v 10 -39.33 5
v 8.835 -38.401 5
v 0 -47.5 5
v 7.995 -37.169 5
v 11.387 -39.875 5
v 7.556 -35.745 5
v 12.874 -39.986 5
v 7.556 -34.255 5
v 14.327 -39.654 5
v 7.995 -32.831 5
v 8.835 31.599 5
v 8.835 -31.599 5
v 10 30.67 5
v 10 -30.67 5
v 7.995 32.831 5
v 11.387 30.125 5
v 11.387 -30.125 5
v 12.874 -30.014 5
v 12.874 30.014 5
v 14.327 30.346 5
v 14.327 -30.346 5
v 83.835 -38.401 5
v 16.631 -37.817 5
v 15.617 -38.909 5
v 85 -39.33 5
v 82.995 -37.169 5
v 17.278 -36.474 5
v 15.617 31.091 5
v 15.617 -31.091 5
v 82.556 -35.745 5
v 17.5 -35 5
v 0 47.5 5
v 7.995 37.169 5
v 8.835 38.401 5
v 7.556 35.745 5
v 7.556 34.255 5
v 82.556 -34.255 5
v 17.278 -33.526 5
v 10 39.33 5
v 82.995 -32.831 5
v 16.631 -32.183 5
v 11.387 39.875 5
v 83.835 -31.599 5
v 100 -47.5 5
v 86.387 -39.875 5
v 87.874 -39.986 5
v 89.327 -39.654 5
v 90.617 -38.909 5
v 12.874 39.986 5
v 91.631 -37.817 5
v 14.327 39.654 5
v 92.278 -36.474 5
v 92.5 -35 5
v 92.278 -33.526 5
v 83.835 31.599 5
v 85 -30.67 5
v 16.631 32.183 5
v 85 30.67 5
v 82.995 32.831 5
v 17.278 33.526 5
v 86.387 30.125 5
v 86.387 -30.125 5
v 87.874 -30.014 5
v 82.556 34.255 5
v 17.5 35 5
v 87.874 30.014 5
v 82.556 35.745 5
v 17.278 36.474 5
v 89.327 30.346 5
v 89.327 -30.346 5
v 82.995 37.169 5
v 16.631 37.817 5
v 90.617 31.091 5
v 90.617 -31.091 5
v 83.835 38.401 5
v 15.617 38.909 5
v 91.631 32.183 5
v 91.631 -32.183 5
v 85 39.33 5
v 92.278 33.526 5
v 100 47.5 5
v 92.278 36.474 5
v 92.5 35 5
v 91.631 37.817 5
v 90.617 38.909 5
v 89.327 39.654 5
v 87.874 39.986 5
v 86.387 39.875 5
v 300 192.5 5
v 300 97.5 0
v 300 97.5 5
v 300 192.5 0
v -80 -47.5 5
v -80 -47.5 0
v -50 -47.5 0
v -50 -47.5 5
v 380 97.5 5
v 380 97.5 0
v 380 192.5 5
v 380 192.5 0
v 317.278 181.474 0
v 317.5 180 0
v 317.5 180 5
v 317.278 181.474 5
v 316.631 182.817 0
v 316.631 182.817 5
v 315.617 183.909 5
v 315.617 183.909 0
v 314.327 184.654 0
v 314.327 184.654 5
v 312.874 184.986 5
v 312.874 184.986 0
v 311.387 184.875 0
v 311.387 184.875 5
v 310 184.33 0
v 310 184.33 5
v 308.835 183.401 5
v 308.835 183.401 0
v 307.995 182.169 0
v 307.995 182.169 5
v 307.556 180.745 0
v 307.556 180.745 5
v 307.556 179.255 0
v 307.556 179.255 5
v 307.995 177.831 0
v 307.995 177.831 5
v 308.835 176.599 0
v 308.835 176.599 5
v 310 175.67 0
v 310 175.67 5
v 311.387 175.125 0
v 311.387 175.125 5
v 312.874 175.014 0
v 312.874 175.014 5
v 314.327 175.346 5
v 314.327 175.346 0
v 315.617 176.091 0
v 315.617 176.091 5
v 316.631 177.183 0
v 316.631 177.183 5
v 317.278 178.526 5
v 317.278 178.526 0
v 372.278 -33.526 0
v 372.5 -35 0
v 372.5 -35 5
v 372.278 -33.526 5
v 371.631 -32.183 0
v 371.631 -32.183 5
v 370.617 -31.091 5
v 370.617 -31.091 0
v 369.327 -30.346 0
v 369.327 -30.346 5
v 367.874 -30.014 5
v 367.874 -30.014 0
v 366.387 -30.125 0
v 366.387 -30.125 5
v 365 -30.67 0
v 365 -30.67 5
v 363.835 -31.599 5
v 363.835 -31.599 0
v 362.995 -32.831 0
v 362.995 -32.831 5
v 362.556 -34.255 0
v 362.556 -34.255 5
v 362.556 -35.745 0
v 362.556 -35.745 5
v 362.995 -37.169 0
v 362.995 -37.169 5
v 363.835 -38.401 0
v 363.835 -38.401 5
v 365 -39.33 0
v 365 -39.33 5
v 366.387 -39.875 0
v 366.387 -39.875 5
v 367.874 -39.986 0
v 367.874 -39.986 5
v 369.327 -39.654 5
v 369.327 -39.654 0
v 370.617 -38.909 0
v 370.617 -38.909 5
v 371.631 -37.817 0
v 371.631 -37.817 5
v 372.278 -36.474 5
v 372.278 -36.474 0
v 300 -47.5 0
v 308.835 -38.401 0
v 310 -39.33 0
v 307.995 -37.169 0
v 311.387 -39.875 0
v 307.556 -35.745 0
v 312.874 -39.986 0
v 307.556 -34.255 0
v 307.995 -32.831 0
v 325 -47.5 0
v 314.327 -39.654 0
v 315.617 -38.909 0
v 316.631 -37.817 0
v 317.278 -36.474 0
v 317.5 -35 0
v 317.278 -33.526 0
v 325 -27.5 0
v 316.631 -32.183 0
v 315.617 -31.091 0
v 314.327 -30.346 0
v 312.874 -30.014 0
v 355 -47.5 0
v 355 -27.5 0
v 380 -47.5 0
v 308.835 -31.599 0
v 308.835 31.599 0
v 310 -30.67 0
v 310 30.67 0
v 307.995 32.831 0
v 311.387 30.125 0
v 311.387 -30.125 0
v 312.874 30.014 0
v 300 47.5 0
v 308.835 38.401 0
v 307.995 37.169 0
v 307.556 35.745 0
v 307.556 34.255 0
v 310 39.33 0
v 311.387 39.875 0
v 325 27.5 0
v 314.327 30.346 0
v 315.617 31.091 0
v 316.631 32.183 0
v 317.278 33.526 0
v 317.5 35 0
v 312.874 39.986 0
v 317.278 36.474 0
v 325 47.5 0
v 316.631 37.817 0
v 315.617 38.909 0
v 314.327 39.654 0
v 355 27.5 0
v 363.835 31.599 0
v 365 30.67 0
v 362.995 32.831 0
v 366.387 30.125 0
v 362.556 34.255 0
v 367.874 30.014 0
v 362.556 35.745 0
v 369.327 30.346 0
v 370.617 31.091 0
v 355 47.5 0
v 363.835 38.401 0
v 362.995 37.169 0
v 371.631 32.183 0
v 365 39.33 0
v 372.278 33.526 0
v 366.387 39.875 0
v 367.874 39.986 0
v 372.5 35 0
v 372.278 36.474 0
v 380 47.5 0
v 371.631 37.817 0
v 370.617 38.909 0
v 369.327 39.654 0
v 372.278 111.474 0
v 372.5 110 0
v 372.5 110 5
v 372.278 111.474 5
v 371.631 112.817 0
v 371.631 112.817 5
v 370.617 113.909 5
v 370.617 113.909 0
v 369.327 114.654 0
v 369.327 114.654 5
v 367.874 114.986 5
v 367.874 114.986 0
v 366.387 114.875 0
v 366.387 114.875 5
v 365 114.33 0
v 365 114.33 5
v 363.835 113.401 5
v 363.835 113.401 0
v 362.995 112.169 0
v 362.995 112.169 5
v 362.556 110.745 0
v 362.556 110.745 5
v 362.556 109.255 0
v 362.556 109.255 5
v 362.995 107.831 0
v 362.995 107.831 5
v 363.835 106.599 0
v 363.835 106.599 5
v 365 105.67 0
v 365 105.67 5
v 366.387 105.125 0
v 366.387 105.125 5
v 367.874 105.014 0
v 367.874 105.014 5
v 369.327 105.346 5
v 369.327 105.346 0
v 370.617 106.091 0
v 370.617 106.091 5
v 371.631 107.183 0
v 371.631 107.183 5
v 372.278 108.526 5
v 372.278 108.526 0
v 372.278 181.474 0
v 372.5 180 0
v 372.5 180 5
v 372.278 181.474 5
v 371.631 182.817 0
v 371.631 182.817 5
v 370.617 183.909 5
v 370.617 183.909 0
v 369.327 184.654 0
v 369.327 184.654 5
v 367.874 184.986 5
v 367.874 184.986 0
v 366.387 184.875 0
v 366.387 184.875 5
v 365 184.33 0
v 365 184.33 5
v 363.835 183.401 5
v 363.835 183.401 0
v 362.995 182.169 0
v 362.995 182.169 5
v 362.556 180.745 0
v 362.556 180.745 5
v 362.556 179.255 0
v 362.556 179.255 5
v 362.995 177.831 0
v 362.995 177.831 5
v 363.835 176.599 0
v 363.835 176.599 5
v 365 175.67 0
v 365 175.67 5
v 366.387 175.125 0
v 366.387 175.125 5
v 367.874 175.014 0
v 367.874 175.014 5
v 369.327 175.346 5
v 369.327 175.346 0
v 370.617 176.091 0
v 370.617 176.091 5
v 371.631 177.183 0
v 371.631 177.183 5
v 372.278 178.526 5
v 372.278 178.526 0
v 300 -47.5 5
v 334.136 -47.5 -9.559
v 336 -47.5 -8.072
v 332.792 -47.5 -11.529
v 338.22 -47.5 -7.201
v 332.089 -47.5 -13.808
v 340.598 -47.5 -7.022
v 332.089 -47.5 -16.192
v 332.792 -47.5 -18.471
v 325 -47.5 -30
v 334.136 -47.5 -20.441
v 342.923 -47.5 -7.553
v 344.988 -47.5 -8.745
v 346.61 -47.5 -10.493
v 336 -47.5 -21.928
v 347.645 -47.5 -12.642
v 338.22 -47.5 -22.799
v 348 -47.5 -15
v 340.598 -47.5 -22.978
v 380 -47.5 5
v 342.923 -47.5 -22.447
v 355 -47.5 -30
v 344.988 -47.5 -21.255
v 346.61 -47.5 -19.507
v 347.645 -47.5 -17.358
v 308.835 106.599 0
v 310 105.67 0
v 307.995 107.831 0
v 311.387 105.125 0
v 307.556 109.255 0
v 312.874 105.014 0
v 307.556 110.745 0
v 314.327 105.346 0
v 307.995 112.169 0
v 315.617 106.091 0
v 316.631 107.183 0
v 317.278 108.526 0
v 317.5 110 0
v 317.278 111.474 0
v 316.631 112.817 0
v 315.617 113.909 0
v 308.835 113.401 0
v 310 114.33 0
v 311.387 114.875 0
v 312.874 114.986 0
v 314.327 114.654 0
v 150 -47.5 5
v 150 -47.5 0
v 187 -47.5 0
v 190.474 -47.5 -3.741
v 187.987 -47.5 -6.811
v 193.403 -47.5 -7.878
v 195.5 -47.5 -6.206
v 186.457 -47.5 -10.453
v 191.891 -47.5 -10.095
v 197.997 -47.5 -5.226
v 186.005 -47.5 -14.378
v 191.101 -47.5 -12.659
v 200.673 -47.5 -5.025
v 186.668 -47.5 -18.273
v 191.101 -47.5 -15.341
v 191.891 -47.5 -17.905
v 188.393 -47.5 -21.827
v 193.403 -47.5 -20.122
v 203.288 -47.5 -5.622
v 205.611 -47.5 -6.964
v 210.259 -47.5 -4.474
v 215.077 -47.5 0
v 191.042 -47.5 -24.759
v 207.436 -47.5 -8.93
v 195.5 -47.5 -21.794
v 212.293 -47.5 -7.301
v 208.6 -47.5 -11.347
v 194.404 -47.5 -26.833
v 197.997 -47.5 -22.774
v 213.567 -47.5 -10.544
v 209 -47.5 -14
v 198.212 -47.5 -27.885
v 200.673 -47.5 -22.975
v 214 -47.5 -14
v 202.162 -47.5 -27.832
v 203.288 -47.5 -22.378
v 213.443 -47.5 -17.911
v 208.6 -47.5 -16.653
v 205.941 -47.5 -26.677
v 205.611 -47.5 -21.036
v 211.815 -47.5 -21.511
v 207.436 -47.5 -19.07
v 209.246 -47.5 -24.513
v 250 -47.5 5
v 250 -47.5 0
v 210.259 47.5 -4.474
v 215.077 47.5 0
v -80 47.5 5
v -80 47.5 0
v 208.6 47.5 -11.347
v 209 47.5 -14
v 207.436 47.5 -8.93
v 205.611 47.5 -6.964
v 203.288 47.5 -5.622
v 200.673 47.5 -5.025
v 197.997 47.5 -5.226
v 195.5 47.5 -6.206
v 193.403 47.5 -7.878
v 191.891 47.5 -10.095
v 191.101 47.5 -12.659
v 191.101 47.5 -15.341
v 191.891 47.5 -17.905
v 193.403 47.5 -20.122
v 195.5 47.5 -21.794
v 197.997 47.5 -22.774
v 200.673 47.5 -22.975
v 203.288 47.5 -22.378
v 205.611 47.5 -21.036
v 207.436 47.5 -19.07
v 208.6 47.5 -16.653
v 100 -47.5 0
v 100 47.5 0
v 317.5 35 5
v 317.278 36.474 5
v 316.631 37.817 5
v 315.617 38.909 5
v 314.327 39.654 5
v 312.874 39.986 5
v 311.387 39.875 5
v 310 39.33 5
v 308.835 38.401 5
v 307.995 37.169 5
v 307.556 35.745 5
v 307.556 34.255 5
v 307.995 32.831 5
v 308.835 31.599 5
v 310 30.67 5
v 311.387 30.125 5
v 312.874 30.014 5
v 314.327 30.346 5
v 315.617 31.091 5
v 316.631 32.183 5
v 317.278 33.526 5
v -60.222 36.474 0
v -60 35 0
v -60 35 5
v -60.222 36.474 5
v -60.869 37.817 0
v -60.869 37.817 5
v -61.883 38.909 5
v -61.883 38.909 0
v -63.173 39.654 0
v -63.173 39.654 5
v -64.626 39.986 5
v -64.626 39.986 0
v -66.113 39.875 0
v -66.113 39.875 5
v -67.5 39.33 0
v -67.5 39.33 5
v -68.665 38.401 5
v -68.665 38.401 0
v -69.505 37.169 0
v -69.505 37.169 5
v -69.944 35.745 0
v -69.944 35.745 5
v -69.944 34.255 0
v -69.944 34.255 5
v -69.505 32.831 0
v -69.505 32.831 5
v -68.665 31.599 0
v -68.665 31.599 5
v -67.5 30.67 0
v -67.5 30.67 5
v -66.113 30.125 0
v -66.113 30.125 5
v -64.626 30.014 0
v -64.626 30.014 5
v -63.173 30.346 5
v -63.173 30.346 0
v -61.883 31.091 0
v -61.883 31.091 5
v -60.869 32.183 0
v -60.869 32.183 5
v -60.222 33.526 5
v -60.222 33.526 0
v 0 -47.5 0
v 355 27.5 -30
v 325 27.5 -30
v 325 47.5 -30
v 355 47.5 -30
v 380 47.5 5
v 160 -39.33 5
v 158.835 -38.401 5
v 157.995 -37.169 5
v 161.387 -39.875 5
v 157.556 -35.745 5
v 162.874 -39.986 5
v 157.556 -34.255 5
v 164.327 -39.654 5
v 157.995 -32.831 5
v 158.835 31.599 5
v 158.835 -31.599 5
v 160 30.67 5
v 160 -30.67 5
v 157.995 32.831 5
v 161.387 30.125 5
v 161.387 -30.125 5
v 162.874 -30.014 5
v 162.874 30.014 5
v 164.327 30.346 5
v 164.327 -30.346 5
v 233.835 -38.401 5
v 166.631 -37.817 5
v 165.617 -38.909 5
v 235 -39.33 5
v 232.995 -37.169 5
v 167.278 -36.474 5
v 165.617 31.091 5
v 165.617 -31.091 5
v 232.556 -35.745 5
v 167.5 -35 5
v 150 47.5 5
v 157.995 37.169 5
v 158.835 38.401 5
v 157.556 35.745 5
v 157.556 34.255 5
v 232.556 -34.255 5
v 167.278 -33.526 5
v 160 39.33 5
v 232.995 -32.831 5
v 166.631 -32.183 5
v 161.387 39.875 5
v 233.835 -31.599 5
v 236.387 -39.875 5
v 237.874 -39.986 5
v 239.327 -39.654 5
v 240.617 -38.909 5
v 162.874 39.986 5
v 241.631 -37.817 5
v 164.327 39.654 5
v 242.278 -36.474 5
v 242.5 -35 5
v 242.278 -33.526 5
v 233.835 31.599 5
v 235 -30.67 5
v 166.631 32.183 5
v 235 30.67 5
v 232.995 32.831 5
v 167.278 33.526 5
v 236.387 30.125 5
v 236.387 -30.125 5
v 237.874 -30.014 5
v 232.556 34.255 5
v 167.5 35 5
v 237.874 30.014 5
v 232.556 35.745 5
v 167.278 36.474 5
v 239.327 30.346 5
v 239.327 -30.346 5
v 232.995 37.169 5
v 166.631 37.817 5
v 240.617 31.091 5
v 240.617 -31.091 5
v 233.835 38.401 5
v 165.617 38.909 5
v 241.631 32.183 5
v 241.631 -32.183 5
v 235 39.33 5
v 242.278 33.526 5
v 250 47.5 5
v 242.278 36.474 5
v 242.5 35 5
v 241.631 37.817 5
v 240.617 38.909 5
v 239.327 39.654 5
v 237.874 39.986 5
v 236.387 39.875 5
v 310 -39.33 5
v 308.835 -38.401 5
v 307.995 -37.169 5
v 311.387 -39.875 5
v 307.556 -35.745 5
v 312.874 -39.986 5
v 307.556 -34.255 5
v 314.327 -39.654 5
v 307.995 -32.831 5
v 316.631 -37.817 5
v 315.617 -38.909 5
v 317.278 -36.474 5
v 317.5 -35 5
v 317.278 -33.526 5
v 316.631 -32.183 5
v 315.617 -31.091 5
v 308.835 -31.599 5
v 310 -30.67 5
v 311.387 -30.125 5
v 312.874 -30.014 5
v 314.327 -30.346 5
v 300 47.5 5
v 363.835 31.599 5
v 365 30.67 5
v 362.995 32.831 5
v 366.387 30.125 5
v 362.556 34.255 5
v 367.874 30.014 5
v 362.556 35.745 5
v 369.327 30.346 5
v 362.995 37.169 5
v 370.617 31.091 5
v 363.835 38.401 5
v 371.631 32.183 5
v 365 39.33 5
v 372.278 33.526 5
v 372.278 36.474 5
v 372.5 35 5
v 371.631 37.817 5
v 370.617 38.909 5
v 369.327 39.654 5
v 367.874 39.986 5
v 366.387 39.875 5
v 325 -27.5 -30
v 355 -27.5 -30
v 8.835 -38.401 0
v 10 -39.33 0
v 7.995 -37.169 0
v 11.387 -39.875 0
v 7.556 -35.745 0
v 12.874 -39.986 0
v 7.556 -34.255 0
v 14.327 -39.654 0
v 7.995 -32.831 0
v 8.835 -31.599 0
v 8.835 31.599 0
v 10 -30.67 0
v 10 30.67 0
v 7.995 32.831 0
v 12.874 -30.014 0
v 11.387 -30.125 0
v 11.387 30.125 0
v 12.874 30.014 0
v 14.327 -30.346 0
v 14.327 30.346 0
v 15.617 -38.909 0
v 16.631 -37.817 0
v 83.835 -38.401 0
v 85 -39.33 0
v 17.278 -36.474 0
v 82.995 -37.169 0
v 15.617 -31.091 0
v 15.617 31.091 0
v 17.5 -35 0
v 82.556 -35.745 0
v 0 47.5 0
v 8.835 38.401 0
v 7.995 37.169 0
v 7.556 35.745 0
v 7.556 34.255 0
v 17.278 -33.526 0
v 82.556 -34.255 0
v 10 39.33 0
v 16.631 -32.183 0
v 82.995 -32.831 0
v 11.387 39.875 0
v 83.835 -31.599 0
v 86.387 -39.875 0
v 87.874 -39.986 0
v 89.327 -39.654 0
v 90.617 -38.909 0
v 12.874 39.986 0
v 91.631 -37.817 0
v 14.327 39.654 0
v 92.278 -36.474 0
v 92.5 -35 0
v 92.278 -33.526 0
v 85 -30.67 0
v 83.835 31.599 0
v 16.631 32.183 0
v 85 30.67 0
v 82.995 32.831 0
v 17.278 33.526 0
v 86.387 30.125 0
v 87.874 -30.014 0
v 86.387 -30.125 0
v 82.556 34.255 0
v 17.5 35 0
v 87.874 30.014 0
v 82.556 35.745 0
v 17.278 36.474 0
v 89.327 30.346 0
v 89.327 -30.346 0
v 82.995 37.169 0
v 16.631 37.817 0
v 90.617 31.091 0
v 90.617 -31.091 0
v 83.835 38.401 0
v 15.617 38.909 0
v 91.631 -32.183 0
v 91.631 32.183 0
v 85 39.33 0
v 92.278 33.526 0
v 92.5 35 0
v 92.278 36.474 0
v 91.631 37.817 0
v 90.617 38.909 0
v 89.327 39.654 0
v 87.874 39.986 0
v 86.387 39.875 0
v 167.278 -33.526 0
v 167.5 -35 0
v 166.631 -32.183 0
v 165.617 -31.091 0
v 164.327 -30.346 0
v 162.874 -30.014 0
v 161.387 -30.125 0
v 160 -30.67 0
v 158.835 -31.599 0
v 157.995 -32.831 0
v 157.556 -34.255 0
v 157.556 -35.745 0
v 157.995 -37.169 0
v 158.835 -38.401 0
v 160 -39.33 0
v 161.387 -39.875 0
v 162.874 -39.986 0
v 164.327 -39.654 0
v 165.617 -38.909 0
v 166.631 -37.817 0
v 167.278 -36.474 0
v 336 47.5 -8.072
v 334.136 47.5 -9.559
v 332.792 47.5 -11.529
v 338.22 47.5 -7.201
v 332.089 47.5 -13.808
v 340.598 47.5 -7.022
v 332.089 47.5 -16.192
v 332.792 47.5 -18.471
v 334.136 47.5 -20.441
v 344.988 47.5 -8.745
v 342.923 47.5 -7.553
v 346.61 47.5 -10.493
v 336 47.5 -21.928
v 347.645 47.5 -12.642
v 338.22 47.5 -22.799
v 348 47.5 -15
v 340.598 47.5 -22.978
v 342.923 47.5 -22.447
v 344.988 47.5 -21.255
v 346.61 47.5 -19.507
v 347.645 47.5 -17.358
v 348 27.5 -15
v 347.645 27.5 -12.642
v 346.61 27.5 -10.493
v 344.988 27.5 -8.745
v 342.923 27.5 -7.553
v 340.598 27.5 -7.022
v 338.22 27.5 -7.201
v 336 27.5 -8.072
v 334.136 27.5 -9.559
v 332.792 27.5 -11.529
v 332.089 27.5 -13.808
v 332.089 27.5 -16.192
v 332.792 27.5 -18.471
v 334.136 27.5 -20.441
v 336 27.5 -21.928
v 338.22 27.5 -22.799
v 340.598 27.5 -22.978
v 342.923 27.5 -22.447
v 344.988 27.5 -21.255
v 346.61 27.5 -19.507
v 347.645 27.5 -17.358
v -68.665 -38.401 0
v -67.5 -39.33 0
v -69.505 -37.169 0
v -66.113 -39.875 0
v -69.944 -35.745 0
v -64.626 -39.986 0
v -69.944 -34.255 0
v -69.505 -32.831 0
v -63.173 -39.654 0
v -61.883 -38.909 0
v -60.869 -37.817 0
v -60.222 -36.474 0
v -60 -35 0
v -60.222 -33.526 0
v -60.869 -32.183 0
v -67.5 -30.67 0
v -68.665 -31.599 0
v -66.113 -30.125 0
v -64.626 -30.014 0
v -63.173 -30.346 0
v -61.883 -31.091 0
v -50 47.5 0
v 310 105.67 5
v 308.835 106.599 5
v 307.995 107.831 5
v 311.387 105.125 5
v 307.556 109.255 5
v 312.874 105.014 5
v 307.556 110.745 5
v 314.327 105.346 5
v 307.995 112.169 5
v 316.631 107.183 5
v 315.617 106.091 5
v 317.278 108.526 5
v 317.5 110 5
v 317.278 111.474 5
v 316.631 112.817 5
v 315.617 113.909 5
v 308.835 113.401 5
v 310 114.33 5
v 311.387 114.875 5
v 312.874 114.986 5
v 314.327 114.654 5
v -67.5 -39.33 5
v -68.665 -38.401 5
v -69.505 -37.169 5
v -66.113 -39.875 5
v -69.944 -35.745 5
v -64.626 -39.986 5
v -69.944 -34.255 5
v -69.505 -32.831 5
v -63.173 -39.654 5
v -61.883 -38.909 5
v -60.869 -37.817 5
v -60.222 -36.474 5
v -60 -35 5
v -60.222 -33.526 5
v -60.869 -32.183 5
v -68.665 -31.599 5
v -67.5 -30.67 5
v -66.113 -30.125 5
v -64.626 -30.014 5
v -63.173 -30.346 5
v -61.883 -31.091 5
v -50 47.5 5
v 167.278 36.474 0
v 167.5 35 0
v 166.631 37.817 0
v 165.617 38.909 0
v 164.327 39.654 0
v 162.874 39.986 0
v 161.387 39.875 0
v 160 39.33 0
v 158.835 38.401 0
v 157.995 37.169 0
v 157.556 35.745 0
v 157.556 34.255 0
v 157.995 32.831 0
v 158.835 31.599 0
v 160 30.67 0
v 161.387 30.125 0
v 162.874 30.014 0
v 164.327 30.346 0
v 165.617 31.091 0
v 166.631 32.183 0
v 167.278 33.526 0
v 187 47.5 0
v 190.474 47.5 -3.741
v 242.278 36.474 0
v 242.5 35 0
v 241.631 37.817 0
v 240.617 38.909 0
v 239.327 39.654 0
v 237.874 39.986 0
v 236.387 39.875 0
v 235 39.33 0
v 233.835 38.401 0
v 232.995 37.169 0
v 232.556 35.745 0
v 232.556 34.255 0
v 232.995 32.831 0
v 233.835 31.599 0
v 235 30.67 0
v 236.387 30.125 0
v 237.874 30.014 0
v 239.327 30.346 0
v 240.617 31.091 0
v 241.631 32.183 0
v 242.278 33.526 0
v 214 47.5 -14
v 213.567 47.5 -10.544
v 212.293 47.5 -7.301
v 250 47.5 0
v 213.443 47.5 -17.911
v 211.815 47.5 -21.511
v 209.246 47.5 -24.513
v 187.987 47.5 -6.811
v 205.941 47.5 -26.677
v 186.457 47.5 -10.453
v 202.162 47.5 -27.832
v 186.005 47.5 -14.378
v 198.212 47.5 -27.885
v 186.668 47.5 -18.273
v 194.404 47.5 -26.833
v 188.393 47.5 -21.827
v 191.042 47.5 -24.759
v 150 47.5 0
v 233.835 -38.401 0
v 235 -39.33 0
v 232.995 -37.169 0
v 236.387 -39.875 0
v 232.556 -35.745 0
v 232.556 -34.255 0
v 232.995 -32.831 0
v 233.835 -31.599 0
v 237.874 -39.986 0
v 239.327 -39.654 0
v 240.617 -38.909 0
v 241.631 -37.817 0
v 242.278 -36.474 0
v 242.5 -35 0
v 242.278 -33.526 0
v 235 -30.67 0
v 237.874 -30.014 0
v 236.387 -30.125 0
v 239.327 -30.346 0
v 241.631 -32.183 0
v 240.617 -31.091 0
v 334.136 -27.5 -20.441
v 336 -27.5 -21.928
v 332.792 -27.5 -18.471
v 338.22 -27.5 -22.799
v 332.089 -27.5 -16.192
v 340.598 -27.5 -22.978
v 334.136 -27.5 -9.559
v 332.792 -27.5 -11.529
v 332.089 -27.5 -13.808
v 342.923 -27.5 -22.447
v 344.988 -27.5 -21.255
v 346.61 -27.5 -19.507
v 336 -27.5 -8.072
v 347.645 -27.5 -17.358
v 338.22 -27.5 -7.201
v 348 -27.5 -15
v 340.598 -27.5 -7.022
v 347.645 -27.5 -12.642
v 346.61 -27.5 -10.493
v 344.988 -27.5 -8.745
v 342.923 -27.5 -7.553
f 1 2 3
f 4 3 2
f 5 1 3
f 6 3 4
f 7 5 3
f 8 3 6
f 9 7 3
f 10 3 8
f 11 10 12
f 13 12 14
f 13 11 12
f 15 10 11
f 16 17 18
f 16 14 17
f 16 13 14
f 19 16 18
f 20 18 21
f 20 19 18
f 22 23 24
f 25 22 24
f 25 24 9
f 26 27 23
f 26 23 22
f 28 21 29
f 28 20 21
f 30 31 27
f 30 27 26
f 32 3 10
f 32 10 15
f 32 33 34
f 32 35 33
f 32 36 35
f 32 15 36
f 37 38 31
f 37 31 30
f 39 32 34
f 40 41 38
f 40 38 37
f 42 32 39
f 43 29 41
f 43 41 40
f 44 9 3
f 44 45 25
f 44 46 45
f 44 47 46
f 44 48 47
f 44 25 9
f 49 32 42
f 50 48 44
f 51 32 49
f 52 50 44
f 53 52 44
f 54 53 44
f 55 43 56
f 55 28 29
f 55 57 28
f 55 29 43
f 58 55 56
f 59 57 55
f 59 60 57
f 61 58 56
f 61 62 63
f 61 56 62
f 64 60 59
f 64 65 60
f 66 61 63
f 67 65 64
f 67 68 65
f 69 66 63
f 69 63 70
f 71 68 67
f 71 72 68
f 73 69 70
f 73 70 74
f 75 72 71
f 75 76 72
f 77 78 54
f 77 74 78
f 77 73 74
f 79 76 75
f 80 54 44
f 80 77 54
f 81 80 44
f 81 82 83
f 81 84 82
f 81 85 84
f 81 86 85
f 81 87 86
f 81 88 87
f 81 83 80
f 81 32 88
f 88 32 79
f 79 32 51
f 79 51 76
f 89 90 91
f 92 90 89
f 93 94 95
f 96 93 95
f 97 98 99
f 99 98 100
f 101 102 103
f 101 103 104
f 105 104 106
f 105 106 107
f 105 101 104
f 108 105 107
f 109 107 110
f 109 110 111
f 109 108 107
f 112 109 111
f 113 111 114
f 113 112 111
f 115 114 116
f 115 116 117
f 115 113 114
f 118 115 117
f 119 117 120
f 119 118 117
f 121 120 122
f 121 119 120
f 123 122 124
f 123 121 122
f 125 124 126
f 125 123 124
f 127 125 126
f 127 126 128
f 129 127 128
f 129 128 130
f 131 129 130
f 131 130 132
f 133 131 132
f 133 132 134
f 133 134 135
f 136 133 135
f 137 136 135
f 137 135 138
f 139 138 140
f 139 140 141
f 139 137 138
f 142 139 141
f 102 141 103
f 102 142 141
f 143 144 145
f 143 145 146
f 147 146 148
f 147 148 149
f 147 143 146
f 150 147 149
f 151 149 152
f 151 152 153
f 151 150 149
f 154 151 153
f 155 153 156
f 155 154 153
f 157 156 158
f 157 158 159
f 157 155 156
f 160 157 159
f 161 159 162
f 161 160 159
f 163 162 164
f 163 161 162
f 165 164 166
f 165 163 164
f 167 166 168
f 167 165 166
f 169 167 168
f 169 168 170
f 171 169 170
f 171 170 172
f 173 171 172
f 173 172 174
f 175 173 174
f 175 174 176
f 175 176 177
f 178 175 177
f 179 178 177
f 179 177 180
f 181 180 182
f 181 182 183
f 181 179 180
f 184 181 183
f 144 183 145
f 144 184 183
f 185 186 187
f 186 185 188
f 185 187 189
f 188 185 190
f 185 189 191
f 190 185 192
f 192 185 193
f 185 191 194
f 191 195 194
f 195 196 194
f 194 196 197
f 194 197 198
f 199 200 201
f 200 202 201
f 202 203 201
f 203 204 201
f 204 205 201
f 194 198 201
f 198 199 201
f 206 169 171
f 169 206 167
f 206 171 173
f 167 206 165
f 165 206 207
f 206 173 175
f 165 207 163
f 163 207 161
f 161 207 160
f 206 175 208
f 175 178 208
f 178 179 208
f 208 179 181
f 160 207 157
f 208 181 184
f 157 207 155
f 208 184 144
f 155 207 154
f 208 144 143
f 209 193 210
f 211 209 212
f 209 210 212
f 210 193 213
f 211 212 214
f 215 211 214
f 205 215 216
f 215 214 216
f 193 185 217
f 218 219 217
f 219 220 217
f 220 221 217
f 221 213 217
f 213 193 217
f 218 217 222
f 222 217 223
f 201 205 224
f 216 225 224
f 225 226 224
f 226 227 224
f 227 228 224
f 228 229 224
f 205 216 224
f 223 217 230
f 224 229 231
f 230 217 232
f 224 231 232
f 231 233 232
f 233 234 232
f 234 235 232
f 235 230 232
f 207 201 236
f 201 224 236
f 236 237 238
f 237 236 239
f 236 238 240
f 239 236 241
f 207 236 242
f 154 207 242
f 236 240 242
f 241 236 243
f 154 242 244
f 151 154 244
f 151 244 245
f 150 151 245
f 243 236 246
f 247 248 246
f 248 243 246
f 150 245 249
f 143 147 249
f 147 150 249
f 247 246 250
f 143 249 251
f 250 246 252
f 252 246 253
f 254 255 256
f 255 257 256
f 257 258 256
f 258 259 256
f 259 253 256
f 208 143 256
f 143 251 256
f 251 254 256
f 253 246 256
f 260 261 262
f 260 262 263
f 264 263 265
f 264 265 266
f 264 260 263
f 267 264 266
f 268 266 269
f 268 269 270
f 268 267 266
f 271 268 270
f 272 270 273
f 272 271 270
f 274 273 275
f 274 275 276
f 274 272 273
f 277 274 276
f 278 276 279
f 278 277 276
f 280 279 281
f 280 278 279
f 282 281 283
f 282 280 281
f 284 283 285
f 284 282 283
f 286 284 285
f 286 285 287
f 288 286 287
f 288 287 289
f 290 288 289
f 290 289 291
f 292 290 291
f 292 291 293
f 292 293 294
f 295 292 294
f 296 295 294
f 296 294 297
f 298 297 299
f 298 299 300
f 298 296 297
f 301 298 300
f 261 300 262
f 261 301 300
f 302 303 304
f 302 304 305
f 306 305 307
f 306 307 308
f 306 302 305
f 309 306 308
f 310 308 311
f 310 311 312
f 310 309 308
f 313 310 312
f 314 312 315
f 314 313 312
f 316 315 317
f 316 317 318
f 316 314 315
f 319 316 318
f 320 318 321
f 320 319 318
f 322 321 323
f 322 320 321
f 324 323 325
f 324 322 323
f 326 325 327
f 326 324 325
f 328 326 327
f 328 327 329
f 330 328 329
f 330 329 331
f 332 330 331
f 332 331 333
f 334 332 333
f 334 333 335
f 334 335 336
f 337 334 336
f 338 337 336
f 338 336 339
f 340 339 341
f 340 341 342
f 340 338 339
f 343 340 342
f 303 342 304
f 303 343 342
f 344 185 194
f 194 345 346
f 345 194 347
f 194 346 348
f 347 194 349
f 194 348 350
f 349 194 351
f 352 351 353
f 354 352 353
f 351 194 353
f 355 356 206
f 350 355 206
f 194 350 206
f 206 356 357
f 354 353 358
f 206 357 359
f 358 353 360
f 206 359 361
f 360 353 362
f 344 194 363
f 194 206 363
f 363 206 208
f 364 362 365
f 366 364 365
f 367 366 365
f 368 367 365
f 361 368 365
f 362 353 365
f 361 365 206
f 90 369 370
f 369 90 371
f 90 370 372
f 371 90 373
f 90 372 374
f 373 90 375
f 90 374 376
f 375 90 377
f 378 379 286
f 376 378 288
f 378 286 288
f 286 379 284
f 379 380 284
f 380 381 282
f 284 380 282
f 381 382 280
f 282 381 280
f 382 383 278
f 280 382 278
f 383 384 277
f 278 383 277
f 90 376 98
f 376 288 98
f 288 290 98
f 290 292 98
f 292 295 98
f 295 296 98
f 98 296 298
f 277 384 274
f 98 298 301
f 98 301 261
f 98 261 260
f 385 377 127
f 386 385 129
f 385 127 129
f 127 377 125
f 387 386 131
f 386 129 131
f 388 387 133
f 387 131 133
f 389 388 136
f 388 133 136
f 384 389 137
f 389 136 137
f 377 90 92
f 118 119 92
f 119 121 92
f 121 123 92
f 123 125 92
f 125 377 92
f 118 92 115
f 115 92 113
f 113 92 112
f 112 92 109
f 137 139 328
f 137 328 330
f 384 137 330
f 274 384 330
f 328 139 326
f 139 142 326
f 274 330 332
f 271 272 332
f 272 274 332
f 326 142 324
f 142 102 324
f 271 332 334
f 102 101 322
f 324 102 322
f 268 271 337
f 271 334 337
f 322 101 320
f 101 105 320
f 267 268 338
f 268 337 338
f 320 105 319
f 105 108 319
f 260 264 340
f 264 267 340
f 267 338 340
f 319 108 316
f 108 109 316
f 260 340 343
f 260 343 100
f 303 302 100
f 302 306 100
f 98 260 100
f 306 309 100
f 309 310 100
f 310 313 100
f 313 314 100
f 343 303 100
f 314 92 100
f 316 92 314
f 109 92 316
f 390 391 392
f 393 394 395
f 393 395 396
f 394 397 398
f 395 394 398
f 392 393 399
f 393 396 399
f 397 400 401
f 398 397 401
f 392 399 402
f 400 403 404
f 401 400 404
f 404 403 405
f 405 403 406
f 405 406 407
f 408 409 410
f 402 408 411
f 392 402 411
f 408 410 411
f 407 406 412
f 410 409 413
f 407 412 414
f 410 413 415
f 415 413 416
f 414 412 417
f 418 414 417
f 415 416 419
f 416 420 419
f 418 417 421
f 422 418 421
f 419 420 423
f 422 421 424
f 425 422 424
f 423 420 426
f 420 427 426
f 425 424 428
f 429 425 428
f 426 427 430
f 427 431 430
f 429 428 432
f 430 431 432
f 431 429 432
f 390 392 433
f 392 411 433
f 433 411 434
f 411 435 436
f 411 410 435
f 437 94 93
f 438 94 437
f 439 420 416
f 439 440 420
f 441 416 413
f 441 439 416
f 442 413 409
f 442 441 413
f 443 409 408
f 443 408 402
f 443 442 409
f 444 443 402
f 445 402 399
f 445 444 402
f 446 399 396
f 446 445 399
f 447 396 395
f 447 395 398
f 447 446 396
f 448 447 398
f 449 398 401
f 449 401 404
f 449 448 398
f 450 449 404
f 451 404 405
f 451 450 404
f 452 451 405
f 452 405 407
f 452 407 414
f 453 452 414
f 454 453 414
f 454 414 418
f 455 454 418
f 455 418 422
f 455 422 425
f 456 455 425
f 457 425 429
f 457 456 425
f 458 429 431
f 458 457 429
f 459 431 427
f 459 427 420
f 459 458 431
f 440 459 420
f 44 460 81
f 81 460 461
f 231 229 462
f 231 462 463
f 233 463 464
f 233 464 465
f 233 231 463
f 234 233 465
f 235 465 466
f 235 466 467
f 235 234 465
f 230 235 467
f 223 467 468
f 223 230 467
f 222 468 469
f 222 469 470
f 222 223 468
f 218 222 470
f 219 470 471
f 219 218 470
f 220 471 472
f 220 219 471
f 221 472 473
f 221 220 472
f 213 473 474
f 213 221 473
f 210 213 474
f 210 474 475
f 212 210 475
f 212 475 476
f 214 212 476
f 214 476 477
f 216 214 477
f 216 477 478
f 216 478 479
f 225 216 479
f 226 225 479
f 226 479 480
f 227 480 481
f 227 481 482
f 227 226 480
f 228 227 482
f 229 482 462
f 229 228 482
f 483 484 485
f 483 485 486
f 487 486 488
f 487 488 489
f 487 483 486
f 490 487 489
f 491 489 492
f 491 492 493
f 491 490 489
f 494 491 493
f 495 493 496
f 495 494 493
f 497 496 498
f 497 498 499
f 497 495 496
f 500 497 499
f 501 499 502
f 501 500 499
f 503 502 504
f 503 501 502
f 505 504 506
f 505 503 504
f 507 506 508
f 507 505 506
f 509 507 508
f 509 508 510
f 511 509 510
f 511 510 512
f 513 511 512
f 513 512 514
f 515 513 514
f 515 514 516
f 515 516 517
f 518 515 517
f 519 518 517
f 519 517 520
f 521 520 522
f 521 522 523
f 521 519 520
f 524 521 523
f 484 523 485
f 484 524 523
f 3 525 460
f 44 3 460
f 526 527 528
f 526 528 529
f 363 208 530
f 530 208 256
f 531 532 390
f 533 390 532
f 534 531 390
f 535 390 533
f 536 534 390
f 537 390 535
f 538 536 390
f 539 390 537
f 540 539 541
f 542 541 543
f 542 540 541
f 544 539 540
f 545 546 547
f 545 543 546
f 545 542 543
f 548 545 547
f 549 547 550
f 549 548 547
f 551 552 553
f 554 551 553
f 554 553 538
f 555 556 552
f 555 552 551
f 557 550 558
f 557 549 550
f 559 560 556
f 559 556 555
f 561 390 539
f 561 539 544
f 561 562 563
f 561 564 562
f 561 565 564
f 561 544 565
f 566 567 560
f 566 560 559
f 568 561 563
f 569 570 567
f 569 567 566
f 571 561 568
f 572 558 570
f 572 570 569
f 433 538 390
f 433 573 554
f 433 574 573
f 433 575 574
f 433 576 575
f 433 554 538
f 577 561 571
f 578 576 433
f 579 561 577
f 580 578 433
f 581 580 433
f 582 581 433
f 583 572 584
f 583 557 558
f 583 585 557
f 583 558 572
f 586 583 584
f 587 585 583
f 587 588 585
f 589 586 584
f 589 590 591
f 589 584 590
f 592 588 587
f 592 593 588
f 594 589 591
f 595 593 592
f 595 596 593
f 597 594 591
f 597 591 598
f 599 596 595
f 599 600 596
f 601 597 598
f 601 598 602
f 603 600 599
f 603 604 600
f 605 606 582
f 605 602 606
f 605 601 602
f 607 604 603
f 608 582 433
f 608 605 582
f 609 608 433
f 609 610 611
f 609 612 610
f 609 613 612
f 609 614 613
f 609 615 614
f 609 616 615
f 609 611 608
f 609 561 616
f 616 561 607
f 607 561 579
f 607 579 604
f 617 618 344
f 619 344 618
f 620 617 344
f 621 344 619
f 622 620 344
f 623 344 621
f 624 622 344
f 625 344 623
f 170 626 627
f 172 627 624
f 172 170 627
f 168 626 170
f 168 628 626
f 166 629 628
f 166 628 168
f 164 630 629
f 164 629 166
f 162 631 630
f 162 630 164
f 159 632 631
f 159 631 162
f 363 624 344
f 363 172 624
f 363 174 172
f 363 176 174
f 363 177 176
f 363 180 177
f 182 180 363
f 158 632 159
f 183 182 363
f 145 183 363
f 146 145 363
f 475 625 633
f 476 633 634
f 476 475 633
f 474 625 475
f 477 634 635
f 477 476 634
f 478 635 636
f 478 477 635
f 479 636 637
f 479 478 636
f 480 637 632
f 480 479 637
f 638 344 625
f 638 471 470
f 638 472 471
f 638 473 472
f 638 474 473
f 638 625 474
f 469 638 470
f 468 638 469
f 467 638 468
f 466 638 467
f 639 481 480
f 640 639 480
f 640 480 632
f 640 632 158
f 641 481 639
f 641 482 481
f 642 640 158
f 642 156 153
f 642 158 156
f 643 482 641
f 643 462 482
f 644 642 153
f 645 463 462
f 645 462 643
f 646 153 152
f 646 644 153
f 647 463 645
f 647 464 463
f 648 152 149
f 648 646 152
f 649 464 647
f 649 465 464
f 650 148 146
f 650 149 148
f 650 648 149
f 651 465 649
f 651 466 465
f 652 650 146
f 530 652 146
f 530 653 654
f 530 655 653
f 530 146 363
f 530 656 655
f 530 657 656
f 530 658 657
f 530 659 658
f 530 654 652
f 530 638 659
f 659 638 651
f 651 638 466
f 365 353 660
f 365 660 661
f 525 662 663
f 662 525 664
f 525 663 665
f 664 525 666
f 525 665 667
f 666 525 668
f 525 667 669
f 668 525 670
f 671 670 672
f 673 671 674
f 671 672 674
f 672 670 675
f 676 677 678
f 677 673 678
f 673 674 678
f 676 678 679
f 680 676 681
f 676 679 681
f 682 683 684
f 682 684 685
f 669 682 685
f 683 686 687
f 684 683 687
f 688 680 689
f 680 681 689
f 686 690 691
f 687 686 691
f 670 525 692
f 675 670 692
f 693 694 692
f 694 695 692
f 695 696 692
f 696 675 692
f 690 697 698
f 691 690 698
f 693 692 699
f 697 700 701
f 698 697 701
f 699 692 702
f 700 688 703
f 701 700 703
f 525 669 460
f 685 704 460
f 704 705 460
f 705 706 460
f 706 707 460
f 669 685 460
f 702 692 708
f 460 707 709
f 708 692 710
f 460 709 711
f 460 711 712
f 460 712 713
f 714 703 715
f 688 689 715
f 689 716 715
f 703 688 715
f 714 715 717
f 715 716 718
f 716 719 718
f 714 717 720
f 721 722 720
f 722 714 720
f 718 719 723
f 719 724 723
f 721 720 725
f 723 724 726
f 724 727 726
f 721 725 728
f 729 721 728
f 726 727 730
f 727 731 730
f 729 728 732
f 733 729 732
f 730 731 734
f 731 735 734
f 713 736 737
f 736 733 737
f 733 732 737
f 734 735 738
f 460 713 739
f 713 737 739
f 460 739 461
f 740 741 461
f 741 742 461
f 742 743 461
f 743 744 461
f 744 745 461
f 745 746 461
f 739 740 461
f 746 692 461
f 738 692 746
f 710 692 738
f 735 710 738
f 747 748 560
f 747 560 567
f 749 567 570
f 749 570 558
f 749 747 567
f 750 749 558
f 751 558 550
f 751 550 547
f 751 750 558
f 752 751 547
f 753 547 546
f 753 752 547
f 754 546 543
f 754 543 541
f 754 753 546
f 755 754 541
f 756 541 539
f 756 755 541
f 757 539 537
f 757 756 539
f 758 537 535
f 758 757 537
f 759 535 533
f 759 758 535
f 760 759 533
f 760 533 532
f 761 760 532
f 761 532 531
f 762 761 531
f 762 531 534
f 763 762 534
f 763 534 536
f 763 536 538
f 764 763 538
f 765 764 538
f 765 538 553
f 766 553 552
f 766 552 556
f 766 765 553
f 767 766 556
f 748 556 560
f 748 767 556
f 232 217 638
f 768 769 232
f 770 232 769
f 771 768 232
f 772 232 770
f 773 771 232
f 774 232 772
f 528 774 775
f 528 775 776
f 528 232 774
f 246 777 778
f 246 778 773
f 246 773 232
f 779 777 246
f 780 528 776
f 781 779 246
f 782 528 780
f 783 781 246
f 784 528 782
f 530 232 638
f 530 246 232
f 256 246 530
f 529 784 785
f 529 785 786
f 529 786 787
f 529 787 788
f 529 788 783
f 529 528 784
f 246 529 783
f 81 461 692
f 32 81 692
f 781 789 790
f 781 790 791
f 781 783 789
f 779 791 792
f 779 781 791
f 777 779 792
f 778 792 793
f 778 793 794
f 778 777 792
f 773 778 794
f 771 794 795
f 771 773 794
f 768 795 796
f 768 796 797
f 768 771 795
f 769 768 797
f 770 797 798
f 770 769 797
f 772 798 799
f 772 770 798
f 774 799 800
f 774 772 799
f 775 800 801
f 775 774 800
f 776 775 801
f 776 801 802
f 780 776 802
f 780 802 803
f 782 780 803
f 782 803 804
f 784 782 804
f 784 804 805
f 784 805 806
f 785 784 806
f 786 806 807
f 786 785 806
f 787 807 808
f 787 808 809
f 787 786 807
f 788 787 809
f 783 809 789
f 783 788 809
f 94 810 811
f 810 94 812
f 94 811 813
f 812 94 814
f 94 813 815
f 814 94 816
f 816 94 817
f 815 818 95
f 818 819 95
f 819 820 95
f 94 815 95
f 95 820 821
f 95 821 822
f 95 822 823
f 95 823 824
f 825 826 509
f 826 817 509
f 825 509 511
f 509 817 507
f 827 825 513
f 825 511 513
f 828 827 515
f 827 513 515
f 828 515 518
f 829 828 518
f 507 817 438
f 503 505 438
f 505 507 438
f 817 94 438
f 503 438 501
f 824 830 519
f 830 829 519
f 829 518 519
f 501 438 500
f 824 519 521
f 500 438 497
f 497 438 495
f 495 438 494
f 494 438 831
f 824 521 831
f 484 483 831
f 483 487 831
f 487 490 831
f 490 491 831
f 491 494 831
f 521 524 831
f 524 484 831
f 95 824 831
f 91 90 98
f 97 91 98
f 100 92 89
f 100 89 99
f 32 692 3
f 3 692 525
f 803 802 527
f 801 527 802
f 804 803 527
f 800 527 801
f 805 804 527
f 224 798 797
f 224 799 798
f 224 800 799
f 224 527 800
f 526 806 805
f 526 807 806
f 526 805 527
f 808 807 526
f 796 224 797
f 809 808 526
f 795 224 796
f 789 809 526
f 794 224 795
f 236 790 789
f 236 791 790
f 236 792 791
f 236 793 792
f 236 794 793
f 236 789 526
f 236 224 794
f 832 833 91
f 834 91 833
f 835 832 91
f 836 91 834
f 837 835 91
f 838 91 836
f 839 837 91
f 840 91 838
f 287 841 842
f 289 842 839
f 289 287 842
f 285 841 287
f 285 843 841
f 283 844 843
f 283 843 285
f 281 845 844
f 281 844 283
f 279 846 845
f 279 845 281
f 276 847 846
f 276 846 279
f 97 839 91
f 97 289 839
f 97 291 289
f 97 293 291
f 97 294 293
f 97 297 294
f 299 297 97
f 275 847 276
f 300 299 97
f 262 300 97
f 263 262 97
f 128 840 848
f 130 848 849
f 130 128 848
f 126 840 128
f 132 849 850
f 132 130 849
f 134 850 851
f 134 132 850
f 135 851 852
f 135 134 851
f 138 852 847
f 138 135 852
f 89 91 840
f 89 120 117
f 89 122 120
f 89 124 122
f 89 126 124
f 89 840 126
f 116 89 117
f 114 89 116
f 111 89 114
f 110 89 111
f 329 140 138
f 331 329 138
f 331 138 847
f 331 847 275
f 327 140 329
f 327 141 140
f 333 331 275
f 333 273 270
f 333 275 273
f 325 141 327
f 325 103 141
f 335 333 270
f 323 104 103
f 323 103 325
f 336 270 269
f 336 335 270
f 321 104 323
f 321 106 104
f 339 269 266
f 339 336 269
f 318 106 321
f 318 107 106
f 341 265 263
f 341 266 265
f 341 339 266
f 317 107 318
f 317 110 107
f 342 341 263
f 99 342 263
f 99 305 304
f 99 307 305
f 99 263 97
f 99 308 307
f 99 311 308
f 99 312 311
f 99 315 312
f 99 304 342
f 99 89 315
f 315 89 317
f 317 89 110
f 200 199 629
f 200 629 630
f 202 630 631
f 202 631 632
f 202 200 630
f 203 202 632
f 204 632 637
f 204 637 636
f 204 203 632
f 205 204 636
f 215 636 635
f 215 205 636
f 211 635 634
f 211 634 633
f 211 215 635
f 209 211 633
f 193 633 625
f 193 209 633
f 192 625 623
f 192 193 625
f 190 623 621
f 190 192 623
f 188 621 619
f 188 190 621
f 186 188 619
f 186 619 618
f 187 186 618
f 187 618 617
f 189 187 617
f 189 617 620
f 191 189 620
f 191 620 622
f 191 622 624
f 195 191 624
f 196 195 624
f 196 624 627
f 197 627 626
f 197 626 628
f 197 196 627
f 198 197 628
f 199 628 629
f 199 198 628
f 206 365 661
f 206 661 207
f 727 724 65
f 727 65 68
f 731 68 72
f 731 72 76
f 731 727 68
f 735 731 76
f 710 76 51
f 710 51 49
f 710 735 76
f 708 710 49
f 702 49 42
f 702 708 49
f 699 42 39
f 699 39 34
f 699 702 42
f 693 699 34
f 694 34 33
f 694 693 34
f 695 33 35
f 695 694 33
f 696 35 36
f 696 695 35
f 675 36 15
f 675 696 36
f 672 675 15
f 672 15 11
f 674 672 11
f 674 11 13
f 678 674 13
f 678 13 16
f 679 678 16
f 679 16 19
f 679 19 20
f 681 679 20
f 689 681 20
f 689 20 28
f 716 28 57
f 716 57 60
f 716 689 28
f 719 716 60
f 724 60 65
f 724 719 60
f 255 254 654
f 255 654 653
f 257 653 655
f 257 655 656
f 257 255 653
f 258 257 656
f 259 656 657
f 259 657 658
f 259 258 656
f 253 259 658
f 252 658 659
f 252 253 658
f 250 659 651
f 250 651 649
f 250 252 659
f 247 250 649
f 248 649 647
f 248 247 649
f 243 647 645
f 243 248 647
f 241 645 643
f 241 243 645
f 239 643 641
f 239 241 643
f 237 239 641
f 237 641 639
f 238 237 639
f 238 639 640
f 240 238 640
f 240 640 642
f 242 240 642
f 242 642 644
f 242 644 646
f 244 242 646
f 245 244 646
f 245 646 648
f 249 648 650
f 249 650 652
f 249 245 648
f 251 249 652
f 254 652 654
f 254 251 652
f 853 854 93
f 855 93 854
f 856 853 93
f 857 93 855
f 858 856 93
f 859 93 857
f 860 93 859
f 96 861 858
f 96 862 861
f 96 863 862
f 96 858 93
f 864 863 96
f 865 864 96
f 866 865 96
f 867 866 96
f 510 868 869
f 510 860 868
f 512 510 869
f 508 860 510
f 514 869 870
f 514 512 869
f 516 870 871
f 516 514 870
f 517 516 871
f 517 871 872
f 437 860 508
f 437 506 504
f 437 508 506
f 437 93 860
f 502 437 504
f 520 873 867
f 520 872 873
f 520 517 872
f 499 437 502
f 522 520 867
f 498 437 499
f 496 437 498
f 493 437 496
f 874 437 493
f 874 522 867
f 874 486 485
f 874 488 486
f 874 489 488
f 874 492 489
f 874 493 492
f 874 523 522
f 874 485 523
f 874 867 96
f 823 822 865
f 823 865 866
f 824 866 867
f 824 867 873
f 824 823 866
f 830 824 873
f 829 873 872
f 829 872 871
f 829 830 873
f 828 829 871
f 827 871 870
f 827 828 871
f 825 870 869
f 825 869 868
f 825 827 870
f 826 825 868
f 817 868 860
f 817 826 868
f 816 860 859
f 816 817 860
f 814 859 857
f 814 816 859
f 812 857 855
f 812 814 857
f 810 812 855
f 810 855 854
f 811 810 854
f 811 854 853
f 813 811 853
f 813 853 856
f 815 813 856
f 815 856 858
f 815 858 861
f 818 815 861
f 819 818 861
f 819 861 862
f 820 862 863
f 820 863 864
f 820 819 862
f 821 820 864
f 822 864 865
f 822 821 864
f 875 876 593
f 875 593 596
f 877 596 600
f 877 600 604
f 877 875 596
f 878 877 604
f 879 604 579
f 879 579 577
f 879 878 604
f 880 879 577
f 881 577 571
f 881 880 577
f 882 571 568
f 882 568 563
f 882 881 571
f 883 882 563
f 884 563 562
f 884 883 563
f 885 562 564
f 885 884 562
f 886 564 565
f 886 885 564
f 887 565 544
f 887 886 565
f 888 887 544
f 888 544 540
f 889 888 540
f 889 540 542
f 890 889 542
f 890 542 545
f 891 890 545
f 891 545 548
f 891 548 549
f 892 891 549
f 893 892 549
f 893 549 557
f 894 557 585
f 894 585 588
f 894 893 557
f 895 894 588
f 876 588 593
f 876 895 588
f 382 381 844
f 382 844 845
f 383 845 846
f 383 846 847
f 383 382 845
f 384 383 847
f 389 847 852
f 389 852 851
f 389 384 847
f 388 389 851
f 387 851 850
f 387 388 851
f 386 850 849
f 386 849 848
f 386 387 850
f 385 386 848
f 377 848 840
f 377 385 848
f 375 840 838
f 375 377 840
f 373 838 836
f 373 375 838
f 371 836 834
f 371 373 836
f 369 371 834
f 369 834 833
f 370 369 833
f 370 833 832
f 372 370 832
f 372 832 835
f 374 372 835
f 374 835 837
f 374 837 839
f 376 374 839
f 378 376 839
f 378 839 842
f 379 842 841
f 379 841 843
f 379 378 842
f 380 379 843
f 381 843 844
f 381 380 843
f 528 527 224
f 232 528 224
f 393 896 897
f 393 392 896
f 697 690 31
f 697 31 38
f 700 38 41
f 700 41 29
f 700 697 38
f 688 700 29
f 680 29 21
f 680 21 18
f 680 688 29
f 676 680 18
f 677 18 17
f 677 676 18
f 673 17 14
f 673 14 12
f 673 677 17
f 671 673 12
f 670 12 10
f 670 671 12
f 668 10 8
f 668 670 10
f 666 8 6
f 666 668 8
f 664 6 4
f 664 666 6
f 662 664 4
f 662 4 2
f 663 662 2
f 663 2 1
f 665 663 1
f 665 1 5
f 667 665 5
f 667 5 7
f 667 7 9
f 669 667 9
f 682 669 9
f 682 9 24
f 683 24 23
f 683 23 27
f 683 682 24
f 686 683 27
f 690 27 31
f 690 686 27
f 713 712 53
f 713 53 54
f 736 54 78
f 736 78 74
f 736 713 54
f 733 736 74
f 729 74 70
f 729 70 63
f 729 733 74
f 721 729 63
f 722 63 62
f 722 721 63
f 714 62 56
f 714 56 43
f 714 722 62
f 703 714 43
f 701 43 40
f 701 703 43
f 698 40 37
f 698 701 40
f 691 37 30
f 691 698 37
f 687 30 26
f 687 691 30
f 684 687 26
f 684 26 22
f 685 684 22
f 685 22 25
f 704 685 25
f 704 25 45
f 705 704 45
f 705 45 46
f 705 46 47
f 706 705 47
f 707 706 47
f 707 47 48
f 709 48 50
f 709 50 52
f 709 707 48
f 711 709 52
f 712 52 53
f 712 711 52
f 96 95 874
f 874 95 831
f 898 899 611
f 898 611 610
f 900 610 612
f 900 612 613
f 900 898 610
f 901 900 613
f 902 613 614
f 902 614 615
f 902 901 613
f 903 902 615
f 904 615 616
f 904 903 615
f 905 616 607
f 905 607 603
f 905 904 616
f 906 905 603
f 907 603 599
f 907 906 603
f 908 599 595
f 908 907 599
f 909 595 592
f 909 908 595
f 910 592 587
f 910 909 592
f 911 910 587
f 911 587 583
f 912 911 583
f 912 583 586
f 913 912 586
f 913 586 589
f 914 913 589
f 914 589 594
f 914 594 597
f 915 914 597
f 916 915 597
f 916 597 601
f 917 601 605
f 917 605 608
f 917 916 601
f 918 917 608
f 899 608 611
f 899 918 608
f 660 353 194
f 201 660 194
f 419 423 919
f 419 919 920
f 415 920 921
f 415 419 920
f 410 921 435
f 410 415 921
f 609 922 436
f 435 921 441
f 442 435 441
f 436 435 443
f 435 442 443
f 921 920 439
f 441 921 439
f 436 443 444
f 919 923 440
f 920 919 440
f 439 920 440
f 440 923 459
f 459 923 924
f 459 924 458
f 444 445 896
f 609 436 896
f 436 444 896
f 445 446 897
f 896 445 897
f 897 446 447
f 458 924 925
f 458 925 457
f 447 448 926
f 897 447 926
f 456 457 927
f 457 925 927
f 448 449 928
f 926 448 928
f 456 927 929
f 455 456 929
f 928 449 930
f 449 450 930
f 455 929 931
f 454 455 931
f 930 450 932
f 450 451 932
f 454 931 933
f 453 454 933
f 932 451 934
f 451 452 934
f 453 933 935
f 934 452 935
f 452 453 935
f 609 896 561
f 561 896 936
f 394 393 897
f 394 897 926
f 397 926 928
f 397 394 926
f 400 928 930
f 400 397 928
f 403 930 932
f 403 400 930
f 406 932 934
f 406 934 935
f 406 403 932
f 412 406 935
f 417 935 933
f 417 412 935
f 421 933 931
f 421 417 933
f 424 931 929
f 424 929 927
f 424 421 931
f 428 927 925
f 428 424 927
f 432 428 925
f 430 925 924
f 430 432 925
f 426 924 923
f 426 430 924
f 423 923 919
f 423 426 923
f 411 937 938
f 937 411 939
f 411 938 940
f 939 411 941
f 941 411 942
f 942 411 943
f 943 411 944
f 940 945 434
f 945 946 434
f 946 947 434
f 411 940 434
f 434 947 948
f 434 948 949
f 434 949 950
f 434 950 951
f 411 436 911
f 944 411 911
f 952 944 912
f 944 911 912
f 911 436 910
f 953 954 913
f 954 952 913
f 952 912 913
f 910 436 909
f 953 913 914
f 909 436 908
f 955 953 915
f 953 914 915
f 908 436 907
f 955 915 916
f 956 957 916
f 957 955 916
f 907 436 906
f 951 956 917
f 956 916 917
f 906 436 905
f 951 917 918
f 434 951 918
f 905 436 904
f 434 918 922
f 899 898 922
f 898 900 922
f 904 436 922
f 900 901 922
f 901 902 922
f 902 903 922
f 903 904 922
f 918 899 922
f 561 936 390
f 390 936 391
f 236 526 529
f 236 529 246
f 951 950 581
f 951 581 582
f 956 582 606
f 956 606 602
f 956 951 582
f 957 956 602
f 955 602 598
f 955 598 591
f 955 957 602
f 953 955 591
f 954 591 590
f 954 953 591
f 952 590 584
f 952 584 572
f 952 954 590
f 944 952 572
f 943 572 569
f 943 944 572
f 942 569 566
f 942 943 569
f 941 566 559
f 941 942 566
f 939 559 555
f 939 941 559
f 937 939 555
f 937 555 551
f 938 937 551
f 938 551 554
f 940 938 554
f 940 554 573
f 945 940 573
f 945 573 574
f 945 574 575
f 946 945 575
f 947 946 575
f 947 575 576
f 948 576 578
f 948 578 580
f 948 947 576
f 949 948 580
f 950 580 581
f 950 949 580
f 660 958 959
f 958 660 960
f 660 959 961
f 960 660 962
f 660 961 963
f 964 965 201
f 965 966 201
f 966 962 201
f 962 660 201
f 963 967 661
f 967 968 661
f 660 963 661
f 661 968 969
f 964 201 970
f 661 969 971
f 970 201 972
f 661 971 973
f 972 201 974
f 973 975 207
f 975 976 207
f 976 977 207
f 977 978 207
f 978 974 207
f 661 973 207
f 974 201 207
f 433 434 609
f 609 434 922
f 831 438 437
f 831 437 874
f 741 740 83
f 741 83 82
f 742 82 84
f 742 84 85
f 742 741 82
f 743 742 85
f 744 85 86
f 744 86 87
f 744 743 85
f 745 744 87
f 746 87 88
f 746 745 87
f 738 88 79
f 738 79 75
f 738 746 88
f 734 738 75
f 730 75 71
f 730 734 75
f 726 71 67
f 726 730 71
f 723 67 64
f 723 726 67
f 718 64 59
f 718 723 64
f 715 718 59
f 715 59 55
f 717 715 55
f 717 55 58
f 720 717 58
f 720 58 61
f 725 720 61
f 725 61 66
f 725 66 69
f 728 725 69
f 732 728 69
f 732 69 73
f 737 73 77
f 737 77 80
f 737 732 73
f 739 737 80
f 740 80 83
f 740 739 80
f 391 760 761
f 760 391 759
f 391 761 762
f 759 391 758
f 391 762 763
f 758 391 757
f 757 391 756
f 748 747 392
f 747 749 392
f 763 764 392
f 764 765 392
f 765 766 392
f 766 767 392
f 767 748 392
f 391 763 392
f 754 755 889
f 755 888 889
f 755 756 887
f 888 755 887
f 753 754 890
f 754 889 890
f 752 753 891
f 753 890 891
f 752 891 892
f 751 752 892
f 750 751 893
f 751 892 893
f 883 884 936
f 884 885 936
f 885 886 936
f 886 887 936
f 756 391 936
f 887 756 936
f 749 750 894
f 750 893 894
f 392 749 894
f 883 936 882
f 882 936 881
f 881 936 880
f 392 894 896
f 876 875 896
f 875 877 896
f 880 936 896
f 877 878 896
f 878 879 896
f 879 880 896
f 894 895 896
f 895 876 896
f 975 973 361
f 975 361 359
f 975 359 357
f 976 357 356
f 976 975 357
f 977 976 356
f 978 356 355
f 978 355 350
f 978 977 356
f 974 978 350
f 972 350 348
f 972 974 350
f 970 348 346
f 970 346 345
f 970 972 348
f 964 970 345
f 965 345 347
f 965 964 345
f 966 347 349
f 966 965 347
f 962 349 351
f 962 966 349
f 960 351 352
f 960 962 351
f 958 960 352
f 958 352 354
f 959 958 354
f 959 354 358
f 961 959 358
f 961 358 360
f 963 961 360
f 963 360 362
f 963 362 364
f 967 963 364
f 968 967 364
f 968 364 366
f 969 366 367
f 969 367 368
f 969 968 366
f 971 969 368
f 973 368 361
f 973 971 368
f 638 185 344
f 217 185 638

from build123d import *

# Parameters (mm, degrees)
F0_R     = 5
F0_W     = 30
F0_H     = 95
F0_W_2   = 80
F1_DEPTH = 5
F2_R     = 9
F3_DEPTH = 47.5
F2_W     = 30
F2_H     = 30
F2_R_2   = 8
F4_DEPTH = 47.5
F5_DEPTH = 27.5


with BuildPart() as f1:
    # F0 (on Top) → F1 (new body)
    with BuildSketch(Plane.XY):
        Polygon((0, 47.5), (0, 0), (0, -47.5), (100, -47.5), (100, 47.5), align=None)
        with Locations((12.5, -35)):
            Circle(F0_R, mode=Mode.SUBTRACT)
        with Locations((87.5, -35)):
            Circle(F0_R, mode=Mode.SUBTRACT)
        with Locations((12.5, 35)):
            Circle(F0_R, mode=Mode.SUBTRACT)
        with Locations((87.5, 35)):
            Circle(F0_R, mode=Mode.SUBTRACT)
        with Locations((-65, 0)):
            Rectangle(F0_W, F0_H)
        with Locations((-65, -35)):
            Circle(F0_R, mode=Mode.SUBTRACT)
        with Locations((-65, 35)):
            Circle(F0_R, mode=Mode.SUBTRACT)
        Polygon((150, 47.5), (150, -47.5), (250, -47.5), (250, 0), (250, 47.5), align=None)
        with Locations((162.5, -35)):
            Circle(F0_R, mode=Mode.SUBTRACT)
        with Locations((237.5, -35)):
            Circle(F0_R, mode=Mode.SUBTRACT)
        with Locations((162.5, 35)):
            Circle(F0_R, mode=Mode.SUBTRACT)
        with Locations((237.5, 35)):
            Circle(F0_R, mode=Mode.SUBTRACT)
        with Locations((340, 0)):
            Rectangle(F0_W_2, F0_H)
        with Locations((312.5, -35)):
            Circle(F0_R, mode=Mode.SUBTRACT)
        with Locations((367.5, -35)):
            Circle(F0_R, mode=Mode.SUBTRACT)
        with Locations((312.5, 35)):
            Circle(F0_R, mode=Mode.SUBTRACT)
        with Locations((367.5, 35)):
            Circle(F0_R, mode=Mode.SUBTRACT)
        with Locations((340, 145)):
            Rectangle(F0_W_2, F0_H)
        with Locations((312.5, 110)):
            Circle(F0_R, mode=Mode.SUBTRACT)
        with Locations((367.5, 110)):
            Circle(F0_R, mode=Mode.SUBTRACT)
        with Locations((312.5, 180)):
            Circle(F0_R, mode=Mode.SUBTRACT)
        with Locations((367.5, 180)):
            Circle(F0_R, mode=Mode.SUBTRACT)
    extrude(amount=F1_DEPTH)

    # F2 (on Front) → F3 (join, symmetric)
    with BuildSketch(Plane.XZ):
        with BuildLine():
            ThreePointArc((190.473685, -3.740891), (194.882751, -0.968739), (200, 0))
            Line((200, 0), (187, 0))
            Line((187, 0), (190.473685, -3.740891))
        make_face()
        with BuildLine():
            Line((210.259109, -4.473685), (215.076923, 0))
            Line((215.076923, 0), (200, 0))
            ThreePointArc((200, 0), (205.596051, -1.167066), (210.259109, -4.473685))
        make_face()
        with BuildLine():
            ThreePointArc((210.259109, -4.473685), (205.596051, -1.167066), (200, 0))
            ThreePointArc((200, 0), (194.882751, -0.968739), (190.473685, -3.740891))
            ThreePointArc((190.473685, -3.740891), (194.403949, -26.832934), (214, -14))
            ThreePointArc((214, -14), (213.031261, -8.882751), (210.259109, -4.473685))
        make_face()
        with Locations((200, -14)):
            Circle(F2_R, mode=Mode.SUBTRACT)
    extrude(amount=F3_DEPTH, both=True)

    # F2 (on Front) → F4 (join, symmetric)
    with BuildSketch(Plane.XZ):
        with Locations((340, -15)):
            Rectangle(F2_W, F2_H)
        with Locations((340, -15)):
            Circle(F2_R_2, mode=Mode.SUBTRACT)
    extrude(amount=F4_DEPTH, both=True)

    # F2 (on Front) → F5 (cut, symmetric)
    with BuildSketch(Plane.XZ):
        with Locations((340, -15)):
            Rectangle(F2_W, F2_H)
        with Locations((340, -15)):
            Circle(F2_R_2, mode=Mode.SUBTRACT)
    extrude(amount=F5_DEPTH, both=True, mode=Mode.SUBTRACT)


solid = f1.part
